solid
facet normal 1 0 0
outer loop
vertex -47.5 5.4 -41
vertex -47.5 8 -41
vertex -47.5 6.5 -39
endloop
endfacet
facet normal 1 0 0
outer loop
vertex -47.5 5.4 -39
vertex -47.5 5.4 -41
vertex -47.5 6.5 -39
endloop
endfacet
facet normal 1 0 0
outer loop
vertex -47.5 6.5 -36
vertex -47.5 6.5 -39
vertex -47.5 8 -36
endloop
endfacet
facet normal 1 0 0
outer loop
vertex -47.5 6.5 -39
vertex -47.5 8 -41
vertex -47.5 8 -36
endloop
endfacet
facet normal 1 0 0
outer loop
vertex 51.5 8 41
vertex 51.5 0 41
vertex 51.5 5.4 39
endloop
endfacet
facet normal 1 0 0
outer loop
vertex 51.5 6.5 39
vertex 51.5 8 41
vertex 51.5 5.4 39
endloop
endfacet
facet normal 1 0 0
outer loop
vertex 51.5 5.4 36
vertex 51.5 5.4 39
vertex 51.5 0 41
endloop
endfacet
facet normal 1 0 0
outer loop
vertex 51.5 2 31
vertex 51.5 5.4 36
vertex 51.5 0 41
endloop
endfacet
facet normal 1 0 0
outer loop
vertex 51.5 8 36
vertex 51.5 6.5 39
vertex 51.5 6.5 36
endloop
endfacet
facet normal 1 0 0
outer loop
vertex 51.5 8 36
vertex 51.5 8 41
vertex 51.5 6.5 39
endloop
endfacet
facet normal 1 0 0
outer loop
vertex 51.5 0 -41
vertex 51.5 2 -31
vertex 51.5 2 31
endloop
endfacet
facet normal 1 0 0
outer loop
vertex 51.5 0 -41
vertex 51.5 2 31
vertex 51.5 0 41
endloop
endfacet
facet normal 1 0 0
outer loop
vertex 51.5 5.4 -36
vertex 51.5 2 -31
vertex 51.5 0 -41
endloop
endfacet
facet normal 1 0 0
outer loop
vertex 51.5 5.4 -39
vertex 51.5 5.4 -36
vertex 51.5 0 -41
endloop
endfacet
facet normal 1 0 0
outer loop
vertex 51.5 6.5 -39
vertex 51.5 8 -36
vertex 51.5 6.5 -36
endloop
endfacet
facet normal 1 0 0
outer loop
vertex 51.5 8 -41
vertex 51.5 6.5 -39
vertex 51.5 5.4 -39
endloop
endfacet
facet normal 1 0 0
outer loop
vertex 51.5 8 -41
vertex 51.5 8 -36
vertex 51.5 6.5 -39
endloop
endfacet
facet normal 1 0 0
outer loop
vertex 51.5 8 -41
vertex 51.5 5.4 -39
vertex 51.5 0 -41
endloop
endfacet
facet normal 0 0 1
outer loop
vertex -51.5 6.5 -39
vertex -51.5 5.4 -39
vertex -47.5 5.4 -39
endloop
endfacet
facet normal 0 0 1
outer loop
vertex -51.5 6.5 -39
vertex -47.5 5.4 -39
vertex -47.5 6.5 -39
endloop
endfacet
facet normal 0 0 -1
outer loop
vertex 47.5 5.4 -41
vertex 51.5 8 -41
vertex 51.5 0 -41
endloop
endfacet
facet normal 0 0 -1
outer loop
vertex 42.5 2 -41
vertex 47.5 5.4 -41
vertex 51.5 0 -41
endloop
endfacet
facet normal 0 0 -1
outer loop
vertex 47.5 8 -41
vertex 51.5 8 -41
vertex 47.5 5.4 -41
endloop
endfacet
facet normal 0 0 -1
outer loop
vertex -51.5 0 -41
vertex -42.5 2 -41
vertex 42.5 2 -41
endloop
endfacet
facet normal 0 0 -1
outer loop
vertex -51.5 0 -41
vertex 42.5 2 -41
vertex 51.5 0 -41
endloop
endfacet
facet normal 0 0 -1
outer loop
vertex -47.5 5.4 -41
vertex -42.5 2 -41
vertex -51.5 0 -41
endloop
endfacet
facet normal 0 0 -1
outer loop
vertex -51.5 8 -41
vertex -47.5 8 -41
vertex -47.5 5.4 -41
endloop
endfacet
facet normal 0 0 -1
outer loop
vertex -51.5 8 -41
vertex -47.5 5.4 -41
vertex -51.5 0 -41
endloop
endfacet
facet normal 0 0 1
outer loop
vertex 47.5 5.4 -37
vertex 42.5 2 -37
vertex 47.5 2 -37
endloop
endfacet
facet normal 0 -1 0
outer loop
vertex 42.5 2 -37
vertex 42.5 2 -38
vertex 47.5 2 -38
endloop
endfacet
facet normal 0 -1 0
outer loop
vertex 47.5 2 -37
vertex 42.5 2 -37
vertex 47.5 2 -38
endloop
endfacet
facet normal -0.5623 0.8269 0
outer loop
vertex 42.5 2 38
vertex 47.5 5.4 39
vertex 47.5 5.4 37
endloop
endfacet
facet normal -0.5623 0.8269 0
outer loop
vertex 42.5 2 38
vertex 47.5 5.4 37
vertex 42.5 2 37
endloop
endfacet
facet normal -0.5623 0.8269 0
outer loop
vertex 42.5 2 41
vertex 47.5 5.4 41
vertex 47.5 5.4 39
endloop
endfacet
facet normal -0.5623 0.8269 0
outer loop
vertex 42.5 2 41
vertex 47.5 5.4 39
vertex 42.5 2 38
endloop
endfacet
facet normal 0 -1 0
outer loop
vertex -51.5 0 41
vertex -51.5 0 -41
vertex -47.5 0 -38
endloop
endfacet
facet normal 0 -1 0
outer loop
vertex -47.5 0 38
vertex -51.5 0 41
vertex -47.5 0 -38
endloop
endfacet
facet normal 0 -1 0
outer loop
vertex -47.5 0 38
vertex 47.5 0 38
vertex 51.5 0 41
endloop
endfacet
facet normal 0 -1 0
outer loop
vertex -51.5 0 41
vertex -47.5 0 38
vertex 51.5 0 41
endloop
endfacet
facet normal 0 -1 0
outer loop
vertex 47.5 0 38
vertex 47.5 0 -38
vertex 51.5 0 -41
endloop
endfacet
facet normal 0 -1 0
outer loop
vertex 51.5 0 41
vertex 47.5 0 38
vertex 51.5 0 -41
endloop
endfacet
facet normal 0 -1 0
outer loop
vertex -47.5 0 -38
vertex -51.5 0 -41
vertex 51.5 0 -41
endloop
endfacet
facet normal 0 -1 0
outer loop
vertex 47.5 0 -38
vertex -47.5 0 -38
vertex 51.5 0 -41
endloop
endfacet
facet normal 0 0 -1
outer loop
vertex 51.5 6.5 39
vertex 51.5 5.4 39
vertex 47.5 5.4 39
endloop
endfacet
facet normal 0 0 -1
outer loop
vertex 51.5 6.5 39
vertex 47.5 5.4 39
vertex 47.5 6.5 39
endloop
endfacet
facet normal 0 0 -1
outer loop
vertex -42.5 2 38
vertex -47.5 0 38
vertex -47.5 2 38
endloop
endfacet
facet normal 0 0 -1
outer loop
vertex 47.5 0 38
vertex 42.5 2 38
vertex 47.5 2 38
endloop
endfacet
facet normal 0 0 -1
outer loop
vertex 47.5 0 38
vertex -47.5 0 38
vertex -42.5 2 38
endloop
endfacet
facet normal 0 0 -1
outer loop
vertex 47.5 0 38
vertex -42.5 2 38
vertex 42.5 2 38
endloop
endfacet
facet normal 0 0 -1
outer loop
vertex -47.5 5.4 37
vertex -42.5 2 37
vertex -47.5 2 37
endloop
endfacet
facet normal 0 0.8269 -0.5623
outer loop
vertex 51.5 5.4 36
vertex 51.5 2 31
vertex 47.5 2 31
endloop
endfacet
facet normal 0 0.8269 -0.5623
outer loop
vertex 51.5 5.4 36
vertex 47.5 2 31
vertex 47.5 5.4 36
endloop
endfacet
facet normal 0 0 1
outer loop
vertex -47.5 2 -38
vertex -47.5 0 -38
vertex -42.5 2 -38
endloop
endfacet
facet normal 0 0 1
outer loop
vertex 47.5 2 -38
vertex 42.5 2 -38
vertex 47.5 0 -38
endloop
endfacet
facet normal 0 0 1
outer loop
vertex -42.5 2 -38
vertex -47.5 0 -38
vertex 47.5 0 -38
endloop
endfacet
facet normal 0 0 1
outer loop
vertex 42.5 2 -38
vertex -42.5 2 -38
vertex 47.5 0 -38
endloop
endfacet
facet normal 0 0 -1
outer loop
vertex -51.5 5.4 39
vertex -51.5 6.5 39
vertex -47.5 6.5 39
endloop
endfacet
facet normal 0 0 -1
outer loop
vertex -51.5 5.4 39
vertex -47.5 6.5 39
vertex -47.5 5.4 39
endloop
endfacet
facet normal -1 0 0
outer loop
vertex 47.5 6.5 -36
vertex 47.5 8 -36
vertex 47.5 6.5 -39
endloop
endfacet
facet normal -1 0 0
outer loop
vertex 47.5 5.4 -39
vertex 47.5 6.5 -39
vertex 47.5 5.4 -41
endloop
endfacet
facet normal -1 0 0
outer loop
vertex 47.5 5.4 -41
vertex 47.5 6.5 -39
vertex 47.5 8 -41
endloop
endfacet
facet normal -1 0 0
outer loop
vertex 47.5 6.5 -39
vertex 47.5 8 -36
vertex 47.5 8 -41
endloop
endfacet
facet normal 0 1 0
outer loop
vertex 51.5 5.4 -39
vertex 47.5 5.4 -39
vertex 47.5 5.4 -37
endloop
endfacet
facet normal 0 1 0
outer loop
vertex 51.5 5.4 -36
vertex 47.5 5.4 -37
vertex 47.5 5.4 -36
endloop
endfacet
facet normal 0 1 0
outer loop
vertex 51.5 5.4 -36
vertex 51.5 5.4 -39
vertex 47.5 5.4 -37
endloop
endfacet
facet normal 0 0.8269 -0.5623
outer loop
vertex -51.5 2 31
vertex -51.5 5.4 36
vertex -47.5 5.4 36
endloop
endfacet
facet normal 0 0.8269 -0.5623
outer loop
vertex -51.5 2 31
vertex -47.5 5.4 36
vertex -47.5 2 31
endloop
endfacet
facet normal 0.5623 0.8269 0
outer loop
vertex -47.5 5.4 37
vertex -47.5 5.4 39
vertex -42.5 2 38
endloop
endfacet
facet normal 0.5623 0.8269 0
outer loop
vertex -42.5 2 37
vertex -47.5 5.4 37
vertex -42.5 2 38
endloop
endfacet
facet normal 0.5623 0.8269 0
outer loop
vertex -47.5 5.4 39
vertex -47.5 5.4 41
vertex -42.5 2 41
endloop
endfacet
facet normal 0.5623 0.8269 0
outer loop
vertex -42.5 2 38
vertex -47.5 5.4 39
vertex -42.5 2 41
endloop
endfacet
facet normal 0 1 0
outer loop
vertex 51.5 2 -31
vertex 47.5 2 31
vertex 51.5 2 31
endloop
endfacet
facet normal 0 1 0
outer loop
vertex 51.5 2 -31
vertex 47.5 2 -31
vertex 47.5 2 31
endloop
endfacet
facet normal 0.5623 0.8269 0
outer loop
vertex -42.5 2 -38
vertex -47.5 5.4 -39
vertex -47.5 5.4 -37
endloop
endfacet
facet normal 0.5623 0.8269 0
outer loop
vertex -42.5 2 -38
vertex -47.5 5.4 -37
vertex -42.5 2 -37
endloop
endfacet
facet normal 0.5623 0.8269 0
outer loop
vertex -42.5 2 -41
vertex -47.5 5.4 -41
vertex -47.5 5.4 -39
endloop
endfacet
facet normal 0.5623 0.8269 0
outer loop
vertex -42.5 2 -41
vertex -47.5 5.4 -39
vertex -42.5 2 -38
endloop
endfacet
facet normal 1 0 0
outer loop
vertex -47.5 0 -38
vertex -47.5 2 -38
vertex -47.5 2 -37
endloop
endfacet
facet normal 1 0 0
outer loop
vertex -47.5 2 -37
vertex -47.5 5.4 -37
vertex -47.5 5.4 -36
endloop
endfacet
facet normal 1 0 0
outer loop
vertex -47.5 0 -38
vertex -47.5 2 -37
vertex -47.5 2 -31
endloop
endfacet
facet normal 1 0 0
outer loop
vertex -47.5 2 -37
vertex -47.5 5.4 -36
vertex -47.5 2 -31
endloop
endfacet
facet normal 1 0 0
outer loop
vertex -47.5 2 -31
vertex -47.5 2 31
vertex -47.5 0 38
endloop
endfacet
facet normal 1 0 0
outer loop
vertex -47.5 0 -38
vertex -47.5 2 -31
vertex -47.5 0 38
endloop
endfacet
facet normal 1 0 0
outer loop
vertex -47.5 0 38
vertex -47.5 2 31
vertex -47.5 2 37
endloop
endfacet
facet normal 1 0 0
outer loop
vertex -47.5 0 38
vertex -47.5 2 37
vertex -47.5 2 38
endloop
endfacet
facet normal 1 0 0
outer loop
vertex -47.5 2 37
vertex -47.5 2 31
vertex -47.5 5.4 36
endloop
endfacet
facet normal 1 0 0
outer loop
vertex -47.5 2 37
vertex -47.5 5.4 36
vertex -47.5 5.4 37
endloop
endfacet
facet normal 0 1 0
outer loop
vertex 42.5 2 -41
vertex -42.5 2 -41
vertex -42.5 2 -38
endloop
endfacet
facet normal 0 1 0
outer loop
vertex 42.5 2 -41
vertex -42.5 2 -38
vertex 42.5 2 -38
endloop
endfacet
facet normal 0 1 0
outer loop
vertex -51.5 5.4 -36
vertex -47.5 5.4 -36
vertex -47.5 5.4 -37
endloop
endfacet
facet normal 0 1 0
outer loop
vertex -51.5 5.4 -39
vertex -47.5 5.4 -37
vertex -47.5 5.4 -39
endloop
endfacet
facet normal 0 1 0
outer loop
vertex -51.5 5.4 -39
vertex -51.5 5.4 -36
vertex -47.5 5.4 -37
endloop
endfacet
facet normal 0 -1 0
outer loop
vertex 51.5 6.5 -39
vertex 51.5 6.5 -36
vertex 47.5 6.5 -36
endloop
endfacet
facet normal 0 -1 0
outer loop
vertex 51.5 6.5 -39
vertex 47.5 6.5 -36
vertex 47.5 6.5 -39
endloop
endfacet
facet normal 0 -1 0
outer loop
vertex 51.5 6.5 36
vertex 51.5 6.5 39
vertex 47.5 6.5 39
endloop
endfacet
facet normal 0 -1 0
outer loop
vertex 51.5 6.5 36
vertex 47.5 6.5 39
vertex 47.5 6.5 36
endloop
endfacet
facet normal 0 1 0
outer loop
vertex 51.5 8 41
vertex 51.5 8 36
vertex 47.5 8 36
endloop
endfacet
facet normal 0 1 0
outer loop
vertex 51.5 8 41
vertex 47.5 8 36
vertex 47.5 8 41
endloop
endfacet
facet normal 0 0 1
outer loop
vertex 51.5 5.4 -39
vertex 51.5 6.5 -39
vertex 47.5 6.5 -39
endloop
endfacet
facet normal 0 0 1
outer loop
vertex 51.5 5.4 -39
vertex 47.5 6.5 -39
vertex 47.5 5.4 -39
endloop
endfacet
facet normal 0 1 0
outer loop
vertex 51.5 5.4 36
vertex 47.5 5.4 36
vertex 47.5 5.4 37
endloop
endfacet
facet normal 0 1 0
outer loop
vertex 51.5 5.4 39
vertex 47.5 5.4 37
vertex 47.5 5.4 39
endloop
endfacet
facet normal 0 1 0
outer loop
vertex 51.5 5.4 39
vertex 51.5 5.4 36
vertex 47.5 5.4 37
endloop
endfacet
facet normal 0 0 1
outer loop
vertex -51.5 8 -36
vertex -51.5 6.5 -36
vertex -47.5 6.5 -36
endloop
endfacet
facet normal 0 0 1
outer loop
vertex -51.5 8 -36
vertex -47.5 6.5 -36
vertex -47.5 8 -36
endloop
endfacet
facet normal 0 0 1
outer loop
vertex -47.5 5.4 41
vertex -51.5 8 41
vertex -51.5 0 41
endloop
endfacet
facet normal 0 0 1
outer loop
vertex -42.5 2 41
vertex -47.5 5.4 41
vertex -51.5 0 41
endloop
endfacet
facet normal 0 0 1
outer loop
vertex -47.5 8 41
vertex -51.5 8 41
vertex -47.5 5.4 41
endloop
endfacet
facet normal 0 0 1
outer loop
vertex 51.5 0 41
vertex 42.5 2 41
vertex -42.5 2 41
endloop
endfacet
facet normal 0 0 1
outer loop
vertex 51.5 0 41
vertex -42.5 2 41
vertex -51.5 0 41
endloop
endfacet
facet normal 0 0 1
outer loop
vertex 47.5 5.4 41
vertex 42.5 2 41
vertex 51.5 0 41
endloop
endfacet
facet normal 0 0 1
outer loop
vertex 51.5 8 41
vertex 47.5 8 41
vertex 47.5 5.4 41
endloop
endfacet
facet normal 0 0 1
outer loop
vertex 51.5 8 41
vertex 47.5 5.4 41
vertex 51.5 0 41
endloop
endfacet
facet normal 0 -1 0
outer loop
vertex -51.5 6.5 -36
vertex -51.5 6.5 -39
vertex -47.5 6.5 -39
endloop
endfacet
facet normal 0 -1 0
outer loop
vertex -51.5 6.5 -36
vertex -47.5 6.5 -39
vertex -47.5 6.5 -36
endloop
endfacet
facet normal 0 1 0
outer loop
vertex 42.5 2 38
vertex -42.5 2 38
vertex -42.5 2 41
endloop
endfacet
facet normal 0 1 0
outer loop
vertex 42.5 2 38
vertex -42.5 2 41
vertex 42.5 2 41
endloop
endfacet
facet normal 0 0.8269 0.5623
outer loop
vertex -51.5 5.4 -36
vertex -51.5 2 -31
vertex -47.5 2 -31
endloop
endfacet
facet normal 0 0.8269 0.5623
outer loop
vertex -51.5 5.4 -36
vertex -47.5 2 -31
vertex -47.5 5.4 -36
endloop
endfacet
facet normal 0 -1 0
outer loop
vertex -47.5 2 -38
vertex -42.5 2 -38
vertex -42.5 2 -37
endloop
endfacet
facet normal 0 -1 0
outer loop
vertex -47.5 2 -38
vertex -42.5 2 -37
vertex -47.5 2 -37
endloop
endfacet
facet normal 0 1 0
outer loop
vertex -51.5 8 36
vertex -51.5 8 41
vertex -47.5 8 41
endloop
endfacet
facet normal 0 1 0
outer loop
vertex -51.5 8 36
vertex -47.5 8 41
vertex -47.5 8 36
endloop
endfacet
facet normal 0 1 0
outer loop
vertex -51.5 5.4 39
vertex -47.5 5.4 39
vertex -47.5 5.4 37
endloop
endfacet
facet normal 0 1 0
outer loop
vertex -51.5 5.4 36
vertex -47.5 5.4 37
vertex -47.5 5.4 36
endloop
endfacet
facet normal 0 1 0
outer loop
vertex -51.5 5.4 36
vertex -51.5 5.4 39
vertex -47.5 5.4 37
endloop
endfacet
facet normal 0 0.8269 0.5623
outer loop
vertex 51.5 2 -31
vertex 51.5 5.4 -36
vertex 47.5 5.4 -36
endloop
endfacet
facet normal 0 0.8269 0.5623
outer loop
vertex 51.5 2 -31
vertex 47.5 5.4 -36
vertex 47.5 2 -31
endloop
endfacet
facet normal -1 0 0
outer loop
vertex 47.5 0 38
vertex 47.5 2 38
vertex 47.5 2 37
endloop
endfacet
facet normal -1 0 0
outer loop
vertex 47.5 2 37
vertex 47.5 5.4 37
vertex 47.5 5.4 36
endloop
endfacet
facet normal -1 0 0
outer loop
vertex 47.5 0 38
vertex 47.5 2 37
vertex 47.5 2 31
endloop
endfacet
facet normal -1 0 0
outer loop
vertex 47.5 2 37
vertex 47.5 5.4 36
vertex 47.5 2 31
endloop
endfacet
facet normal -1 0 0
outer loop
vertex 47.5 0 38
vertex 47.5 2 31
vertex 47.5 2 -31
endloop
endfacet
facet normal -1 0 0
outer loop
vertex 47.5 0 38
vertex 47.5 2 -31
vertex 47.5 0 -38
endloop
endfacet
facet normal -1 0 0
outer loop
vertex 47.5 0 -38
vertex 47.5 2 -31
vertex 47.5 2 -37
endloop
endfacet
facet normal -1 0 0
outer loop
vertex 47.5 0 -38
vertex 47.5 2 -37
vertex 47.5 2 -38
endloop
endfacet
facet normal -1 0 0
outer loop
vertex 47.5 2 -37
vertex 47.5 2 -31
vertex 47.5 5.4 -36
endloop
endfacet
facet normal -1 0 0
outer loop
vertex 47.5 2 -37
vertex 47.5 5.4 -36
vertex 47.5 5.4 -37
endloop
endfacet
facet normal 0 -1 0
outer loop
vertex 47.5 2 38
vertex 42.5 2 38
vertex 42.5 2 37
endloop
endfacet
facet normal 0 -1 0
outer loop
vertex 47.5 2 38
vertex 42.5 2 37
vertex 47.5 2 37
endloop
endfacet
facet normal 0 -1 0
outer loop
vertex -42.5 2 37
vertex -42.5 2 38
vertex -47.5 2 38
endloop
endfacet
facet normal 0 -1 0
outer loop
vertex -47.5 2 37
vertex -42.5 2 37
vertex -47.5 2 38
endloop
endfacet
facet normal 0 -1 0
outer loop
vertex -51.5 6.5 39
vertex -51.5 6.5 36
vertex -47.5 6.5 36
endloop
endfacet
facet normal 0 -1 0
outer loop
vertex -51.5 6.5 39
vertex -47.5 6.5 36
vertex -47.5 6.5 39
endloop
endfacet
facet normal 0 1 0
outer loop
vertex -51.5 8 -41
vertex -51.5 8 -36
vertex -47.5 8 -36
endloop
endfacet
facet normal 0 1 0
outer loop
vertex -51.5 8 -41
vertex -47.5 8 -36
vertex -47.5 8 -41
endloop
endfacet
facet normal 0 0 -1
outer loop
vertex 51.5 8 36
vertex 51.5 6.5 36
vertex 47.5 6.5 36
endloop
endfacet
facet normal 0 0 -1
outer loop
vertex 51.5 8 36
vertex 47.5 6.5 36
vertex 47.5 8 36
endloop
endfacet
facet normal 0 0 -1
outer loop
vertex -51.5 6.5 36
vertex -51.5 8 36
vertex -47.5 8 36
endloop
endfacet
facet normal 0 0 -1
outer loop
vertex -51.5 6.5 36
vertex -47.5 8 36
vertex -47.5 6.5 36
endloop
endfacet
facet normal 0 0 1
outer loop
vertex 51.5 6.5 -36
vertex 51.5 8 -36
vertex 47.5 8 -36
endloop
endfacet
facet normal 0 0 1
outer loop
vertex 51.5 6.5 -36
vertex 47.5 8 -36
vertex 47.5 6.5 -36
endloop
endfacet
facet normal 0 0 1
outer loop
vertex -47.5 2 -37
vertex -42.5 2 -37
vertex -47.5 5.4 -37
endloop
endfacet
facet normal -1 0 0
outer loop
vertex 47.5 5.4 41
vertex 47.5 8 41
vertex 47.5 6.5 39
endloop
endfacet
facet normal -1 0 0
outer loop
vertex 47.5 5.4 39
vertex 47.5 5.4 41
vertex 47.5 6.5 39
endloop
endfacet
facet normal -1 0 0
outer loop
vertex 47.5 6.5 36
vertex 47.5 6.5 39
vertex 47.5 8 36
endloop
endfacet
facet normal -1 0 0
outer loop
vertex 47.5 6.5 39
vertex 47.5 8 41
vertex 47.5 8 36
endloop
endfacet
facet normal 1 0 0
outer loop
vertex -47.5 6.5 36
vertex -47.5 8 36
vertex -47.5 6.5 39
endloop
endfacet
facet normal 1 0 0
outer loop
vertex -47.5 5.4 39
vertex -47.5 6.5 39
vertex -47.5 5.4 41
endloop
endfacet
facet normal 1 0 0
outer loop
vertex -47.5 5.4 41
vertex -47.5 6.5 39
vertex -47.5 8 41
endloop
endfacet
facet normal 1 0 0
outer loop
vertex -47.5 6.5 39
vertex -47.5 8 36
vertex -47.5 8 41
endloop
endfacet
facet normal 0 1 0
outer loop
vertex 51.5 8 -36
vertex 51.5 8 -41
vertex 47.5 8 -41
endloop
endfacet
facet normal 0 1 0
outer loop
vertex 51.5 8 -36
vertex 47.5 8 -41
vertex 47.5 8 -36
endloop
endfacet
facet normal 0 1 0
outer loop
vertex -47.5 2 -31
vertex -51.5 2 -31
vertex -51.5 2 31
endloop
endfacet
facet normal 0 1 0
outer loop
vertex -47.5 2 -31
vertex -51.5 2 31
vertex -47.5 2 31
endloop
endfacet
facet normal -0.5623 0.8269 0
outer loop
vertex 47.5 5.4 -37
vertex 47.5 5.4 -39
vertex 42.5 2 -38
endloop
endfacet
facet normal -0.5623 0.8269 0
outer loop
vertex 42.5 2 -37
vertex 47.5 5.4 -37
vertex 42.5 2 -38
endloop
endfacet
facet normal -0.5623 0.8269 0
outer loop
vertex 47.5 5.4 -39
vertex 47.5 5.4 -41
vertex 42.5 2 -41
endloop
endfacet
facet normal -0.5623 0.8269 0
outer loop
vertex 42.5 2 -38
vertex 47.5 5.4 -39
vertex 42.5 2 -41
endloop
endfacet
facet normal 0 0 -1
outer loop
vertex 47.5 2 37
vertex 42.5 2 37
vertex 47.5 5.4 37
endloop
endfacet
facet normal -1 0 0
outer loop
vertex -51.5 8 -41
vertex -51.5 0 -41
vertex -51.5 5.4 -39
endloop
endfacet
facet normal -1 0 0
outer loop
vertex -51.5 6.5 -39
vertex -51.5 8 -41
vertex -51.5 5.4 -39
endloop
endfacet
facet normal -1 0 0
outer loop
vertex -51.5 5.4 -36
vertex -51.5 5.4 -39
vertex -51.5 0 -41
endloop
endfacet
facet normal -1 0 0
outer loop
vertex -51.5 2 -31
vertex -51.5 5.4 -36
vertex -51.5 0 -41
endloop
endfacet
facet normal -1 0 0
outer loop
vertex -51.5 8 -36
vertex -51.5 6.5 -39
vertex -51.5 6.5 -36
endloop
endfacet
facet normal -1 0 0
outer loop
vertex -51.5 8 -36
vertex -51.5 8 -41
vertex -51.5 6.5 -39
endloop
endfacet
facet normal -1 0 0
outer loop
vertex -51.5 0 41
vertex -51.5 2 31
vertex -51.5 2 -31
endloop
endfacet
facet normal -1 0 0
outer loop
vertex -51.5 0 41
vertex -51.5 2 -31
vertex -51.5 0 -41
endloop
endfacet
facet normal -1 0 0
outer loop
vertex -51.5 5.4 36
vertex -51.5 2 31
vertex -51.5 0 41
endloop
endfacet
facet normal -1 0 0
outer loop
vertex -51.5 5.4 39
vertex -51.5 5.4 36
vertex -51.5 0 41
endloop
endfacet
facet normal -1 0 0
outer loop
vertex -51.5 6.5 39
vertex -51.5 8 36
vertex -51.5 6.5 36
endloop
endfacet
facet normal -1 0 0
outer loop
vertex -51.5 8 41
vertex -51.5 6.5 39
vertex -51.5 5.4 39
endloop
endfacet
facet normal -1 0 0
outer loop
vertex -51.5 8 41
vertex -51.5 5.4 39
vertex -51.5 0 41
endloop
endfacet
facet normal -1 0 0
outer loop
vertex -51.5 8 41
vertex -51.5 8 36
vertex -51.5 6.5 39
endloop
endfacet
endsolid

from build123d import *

# Parameters (mm, degrees)
SKETCH_1_W       = 103
SKETCH_1_H       = 82
SKETCH_1_W_2     = 95
SKETCH_1_H_2     = 76
EXTRUDE_2_DEPTH  = 2
EXTRUDE_3_DEPTH  = 4
EXTRUDE_4_DEPTH  = 4
EXTRUDE_5_DEPTH  = 4
EXTRUDE_6_DEPTH  = 4
EXTRUDE_7_DEPTH  = 4
EXTRUDE_8_DEPTH  = 4
EXTRUDE_9_DEPTH  = 4
EXTRUDE_10_DEPTH = 4


with BuildPart() as part:
    # Эскиз1 → Бобышка-Вытянуть2 (new body)
    with BuildSketch(Plane(origin=(0, 0, 0), x_dir=(1, 0, 0), z_dir=(0, 1, 0))):
        Rectangle(SKETCH_1_W, SKETCH_1_H)
        Rectangle(SKETCH_1_W_2, SKETCH_1_H_2, mode=Mode.SUBTRACT)
    extrude(amount=EXTRUDE_2_DEPTH)

    # Эскиз6 → Бобышка-Вытянуть3 (add)
    with BuildSketch(Plane(origin=(51.5, 0, 0), x_dir=(0, 0, -1), z_dir=(1, 0, 0))):
        Polygon((31, 2), (36, 2), (36, 5.4), align=None)
        Polygon((36, 2), (41, 2), (41, 8), (36, 8), (36, 6.5), (39, 6.5), (39, 5.4), (36, 5.4), align=None)
    extrude(amount=-EXTRUDE_3_DEPTH)

    # Эскиз7 → Бобышка-Вытянуть4 (add)
    with BuildSketch(Plane(origin=(51.5, 0, 0), x_dir=(0, 0, -1), z_dir=(1, 0, 0))):
        Polygon((-41, 8), (-41, 2), (-36, 2), (-36, 5.4), (-39, 5.4), (-39, 6.5), (-36, 6.5), (-36, 8), align=None)
        Polygon((-36, 5.4), (-36, 2), (-31, 2), align=None)
    extrude(amount=-EXTRUDE_4_DEPTH)

    # Эскиз9 → Бобышка-Вытянуть5 (add)
    with BuildSketch(Plane.ZY.offset(51.5)):
        Polygon((-41, 8), (-41, 2), (-36, 2), (-36, 5.4), (-39, 5.4), (-39, 6.5), (-36, 6.5), (-36, 8), align=None)
        Polygon((-36, 5.4), (-36, 2), (-31, 2), align=None)
    extrude(amount=-EXTRUDE_5_DEPTH)

    # Эскиз10 → Бобышка-Вытянуть6 (add)
    with BuildSketch(Plane.ZY.offset(51.5)):
        Polygon((36, 2), (41, 2), (41, 8), (36, 8), (36, 6.5), (39, 6.5), (39, 5.4), (36, 5.4), align=None)
        Polygon((31, 2), (36, 2), (36, 5.4), align=None)
    extrude(amount=-EXTRUDE_6_DEPTH)

    # Эскиз11 → Бобышка-Вытянуть7 (add)
    with BuildSketch(Plane.XY.offset(41)):
        Polygon((-47.5, 2), (-47.5, 5.4), (-42.5, 2), align=None)
    extrude(amount=-EXTRUDE_7_DEPTH)

    # Эскиз12 → Бобышка-Вытянуть8 (add)
    with BuildSketch(Plane.XY.offset(41)):
        Polygon((47.5, 2), (47.5, 5.4), (42.5, 2), align=None)
    extrude(amount=-EXTRUDE_8_DEPTH)

    # Эскиз13 → Бобышка-Вытянуть9 (add)
    with BuildSketch(Plane(origin=(0, 0, -41), x_dir=(-1, 0, 0), z_dir=(0, 0, -1))):
        Polygon((-47.5, 2), (-47.5, 5.4), (-42.5, 2), align=None)
    extrude(amount=-EXTRUDE_9_DEPTH)

    # Эскиз14 → Бобышка-Вытянуть10 (add)
    with BuildSketch(Plane(origin=(0, 0, -41), x_dir=(-1, 0, 0), z_dir=(0, 0, -1))):
        Polygon((47.5, 2), (47.5, 5.4), (42.5, 2), align=None)
    extrude(amount=-EXTRUDE_10_DEPTH)


solid = part.part
